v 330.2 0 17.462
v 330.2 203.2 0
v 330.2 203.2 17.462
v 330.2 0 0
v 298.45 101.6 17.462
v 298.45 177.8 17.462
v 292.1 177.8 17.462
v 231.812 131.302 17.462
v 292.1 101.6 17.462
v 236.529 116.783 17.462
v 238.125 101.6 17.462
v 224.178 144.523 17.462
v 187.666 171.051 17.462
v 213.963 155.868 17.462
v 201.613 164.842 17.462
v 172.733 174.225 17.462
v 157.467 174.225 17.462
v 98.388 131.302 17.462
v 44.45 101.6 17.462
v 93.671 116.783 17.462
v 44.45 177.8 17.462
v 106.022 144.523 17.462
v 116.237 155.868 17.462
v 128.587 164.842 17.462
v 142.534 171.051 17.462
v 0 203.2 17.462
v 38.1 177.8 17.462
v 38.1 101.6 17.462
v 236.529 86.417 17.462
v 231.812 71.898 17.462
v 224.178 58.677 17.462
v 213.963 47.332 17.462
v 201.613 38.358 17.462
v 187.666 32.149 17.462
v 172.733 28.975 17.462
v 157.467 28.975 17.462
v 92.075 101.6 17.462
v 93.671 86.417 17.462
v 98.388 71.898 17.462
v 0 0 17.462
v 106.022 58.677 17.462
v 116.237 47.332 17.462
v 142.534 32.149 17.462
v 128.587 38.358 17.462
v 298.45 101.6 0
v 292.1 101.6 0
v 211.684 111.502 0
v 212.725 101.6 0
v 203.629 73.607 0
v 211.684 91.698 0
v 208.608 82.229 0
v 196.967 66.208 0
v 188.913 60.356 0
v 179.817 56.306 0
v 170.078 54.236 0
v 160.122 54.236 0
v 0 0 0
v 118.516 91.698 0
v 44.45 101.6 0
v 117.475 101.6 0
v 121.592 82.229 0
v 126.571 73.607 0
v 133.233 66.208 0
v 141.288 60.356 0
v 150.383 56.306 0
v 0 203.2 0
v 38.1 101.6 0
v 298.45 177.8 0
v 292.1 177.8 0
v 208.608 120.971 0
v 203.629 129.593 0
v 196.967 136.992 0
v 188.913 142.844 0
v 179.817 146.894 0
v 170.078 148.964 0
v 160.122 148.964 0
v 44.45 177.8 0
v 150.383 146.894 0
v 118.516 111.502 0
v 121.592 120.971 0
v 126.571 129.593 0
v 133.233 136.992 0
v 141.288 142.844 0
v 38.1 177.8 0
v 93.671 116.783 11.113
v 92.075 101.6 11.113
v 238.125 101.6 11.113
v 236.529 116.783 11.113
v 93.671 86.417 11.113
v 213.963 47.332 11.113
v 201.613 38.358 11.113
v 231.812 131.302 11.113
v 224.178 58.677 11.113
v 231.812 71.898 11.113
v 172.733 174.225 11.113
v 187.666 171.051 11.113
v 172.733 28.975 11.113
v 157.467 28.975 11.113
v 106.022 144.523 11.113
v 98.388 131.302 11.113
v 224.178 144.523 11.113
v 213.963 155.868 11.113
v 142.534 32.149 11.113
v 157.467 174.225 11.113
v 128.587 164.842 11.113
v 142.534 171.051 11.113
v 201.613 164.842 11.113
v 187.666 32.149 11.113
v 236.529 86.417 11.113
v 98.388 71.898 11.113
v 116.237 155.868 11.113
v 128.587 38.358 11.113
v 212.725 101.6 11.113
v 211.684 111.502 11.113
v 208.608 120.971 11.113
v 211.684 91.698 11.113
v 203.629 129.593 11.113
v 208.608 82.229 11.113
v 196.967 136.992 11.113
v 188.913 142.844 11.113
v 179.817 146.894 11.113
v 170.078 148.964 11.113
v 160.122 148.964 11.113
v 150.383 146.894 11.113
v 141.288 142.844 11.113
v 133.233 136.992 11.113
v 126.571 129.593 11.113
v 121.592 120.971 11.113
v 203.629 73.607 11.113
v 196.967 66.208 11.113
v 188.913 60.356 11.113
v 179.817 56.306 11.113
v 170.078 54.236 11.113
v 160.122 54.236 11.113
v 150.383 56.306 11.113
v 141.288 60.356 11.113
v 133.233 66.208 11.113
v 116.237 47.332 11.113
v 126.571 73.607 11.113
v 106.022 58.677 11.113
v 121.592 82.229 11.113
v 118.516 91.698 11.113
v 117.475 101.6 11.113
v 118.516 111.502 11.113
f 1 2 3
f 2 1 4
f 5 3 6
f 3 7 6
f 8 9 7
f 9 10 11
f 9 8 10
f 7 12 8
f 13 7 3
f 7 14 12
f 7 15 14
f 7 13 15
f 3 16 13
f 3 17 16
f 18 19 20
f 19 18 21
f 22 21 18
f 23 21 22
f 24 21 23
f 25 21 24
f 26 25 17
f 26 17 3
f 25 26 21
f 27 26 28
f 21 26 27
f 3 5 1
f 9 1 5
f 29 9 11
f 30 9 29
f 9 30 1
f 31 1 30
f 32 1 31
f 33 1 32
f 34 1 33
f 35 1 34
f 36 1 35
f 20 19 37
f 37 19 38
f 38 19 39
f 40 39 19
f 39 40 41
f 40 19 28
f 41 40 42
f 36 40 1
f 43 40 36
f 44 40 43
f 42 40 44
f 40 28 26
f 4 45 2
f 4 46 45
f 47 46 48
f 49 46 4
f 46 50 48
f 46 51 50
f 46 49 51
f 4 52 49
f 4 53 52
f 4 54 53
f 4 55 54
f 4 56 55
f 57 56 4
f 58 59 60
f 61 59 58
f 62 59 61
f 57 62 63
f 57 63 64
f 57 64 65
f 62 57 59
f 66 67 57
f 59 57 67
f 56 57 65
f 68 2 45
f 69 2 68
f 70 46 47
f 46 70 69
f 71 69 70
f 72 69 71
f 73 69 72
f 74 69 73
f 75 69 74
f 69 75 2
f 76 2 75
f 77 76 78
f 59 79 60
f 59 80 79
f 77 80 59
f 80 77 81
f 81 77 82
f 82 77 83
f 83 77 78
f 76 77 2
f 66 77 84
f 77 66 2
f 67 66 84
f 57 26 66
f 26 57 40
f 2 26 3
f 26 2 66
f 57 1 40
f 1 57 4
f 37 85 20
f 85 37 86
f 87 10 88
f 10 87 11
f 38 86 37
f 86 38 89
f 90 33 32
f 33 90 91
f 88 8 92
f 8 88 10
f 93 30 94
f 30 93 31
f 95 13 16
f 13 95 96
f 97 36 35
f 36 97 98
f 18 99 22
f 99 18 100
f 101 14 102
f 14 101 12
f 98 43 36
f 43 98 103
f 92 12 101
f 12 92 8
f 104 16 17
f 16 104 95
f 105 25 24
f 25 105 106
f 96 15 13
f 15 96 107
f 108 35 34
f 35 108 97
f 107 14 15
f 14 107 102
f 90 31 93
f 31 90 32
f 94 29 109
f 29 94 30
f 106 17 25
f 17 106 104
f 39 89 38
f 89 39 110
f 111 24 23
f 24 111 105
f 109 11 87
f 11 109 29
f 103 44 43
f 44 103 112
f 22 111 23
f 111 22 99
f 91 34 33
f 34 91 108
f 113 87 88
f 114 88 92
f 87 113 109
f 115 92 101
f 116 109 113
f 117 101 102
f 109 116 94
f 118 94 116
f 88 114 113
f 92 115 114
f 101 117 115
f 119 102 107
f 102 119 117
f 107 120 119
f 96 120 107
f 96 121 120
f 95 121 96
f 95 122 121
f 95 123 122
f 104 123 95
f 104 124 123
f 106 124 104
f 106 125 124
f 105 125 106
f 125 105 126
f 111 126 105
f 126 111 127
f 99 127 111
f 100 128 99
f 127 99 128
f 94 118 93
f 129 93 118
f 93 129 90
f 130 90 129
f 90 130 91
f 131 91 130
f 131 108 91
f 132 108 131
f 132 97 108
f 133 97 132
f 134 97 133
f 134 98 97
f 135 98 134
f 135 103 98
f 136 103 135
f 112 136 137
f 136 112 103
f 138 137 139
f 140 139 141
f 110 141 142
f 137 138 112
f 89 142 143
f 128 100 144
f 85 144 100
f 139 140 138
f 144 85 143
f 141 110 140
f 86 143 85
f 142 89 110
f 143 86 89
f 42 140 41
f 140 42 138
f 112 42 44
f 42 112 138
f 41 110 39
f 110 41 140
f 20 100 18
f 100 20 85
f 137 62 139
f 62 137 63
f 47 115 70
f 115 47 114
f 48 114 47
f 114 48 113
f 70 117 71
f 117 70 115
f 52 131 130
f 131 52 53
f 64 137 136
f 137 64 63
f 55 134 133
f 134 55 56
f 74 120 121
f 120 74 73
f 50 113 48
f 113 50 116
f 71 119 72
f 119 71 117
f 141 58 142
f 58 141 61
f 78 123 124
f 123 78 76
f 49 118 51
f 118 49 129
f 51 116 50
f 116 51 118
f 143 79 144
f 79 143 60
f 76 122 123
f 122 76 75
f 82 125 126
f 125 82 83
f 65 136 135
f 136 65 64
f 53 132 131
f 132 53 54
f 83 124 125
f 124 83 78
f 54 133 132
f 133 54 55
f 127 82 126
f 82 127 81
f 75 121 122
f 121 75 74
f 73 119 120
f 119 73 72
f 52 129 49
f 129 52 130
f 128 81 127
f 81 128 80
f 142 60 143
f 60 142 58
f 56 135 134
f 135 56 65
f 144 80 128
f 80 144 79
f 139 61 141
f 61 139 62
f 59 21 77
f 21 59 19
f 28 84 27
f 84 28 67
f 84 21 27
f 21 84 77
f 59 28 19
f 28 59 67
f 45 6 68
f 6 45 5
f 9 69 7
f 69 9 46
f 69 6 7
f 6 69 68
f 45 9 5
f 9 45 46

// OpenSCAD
// Router table top

function mm(inch) = inch * 25.4;

topWidth = mm(13);
topDepth = mm(8);
topHeight = mm(11 / 16);

plateDiameter = mm(5.75);
plateThickness = mm(0.25);

holeDiameter = mm(3.75);

slotWidth = mm(0.25);
slotLength = mm(3);
slotInset = mm(1.5);

module slot(position) {

    translate([position, topDepth - mm(1) - slotLength, -0.001])
        cube([slotWidth, slotLength, topHeight + 0.002]);

}


difference() {
    
    cube([topWidth, topDepth, topHeight]);

    translate([topWidth / 2, topDepth / 2, (topHeight - plateThickness) + 0.001])
        cylinder(h = plateThickness, d = plateDiameter, center = false);
    
    translate([topWidth / 2, topDepth / 2, -0.001])
        cylinder(h = topHeight, d = holeDiameter, center = false);
    
    slot(slotInset);
    
    slot(topWidth - slotInset);

}
